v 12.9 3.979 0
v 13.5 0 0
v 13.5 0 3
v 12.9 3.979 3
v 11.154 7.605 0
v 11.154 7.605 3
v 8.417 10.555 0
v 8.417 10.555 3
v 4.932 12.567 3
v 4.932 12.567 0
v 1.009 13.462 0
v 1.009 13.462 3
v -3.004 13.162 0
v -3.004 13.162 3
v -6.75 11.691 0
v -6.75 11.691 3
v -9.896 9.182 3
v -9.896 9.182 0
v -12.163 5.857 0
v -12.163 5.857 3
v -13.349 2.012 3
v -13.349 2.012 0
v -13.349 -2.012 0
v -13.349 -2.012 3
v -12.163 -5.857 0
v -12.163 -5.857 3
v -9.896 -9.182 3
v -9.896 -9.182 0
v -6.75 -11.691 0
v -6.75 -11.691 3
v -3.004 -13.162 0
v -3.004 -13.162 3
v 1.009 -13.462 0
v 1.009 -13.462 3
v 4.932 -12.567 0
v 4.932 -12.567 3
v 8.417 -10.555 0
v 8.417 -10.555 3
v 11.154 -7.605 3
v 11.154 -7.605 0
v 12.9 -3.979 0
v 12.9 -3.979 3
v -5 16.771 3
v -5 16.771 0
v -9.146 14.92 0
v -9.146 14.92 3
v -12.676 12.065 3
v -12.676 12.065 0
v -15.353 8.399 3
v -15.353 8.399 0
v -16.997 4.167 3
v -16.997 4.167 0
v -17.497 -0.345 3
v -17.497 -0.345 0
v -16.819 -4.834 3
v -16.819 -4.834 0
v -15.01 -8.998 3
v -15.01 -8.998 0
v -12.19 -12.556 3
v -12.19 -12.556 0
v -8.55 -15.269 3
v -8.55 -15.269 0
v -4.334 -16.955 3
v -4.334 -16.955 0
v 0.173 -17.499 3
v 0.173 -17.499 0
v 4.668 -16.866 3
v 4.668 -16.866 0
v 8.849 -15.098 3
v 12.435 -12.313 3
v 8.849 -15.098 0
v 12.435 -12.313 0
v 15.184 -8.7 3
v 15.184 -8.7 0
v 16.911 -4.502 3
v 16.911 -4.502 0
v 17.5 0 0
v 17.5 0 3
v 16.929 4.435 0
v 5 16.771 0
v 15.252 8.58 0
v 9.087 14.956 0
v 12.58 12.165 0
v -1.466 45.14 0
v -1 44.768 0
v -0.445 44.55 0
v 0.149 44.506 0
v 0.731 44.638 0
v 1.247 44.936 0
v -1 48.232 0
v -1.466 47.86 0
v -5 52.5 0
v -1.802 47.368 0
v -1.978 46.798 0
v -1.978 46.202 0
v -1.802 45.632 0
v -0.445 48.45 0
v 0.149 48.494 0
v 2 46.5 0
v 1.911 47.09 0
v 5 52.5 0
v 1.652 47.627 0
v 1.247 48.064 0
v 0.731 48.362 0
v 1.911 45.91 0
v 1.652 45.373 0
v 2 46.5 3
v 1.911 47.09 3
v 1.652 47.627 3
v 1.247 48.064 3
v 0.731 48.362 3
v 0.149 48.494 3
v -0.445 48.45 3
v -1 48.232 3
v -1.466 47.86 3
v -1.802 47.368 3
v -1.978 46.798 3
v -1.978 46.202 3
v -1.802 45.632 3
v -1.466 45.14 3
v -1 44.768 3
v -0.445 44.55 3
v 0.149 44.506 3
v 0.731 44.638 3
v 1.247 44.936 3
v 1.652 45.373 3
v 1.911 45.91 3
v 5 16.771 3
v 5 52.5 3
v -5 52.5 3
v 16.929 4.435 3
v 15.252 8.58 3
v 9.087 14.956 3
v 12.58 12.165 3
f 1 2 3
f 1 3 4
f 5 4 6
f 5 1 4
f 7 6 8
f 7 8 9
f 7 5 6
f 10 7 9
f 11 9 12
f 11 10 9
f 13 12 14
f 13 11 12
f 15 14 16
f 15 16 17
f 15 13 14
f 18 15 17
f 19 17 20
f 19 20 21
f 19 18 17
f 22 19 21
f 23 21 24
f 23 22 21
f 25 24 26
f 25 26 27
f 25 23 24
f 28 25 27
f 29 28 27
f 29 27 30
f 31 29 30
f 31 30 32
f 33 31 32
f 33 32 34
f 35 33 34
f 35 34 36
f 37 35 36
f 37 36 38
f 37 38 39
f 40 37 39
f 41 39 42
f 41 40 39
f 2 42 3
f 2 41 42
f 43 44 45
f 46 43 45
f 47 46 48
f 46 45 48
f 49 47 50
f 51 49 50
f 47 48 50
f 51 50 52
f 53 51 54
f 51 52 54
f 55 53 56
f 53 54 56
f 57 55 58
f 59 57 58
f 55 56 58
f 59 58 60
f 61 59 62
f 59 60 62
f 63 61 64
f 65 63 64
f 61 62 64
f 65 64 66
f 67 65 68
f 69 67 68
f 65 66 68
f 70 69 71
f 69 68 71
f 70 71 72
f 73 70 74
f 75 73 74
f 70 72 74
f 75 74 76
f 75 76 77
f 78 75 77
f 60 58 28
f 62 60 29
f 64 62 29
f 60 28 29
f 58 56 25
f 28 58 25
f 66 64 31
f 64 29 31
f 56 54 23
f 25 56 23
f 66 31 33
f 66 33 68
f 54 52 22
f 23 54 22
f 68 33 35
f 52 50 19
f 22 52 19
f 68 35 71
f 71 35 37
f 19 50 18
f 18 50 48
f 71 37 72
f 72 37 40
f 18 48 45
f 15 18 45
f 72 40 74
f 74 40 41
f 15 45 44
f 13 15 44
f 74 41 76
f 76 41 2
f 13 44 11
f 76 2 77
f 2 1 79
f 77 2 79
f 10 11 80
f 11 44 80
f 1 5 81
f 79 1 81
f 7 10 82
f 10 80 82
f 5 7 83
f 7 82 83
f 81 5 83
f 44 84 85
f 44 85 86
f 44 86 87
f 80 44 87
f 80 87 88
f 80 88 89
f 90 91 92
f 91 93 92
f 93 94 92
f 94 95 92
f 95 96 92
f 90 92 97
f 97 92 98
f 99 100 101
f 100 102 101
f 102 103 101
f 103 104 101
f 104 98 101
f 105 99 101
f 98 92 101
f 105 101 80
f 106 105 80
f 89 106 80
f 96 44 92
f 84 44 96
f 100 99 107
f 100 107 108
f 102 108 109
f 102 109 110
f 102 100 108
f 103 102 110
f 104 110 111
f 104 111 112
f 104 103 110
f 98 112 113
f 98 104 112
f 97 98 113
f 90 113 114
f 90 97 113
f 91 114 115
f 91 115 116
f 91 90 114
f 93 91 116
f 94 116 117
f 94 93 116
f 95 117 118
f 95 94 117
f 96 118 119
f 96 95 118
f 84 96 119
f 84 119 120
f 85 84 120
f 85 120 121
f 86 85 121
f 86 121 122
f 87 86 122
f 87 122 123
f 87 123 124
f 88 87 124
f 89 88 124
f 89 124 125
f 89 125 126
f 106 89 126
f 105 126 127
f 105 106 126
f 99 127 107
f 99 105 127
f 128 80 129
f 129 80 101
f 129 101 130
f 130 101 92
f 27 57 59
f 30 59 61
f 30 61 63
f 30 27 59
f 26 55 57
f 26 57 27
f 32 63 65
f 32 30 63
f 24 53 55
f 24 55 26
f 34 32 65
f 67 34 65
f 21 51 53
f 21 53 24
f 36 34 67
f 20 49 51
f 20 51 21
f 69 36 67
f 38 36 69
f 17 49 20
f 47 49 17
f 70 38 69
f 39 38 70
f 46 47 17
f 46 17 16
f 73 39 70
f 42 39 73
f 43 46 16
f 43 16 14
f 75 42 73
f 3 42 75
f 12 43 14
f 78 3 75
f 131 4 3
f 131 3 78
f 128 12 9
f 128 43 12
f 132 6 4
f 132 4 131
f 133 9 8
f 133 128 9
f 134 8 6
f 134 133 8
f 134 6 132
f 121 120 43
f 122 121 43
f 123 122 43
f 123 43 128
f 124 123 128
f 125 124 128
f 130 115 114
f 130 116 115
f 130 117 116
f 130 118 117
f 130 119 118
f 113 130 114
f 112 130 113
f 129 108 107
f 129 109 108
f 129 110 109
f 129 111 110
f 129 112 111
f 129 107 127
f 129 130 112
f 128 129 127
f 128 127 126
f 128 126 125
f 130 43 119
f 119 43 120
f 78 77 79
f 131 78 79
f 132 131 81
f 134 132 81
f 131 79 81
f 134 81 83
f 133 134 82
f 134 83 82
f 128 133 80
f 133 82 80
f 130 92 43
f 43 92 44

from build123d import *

# Parameters (mm, degrees)
F0_R     = 13.5
F0_R_2   = 2
F1_DEPTH = 3


with BuildPart() as f1:
    # F0 (on Top) → F1 (new body)
    with BuildSketch(Plane.XY):
        with BuildLine():
            ThreePointArc((-5, 16.77051), (-10.45825, -14.031215), (17.5, 0))
            ThreePointArc((17.5, 0), (14.031215, 10.45825), (5, 16.77051))
            ThreePointArc((5, 16.77051), (0, 17.5), (-5, 16.77051))
        make_face()
        Circle(F0_R, mode=Mode.SUBTRACT)
        with BuildLine():
            ThreePointArc((-5, 16.77051), (0, 17.5), (5, 16.77051))
            Line((5, 16.77051), (5, 17.5))
            Line((5, 17.5), (5, 52.5))
            Line((5, 52.5), (-5, 52.5))
            Line((-5, 52.5), (-5, 17.5))
            Line((-5, 17.5), (-5, 16.77051))
        make_face()
        with Locations((0, 46.5)):
            Circle(F0_R_2, mode=Mode.SUBTRACT)
    extrude(amount=F1_DEPTH)


solid = f1.part
